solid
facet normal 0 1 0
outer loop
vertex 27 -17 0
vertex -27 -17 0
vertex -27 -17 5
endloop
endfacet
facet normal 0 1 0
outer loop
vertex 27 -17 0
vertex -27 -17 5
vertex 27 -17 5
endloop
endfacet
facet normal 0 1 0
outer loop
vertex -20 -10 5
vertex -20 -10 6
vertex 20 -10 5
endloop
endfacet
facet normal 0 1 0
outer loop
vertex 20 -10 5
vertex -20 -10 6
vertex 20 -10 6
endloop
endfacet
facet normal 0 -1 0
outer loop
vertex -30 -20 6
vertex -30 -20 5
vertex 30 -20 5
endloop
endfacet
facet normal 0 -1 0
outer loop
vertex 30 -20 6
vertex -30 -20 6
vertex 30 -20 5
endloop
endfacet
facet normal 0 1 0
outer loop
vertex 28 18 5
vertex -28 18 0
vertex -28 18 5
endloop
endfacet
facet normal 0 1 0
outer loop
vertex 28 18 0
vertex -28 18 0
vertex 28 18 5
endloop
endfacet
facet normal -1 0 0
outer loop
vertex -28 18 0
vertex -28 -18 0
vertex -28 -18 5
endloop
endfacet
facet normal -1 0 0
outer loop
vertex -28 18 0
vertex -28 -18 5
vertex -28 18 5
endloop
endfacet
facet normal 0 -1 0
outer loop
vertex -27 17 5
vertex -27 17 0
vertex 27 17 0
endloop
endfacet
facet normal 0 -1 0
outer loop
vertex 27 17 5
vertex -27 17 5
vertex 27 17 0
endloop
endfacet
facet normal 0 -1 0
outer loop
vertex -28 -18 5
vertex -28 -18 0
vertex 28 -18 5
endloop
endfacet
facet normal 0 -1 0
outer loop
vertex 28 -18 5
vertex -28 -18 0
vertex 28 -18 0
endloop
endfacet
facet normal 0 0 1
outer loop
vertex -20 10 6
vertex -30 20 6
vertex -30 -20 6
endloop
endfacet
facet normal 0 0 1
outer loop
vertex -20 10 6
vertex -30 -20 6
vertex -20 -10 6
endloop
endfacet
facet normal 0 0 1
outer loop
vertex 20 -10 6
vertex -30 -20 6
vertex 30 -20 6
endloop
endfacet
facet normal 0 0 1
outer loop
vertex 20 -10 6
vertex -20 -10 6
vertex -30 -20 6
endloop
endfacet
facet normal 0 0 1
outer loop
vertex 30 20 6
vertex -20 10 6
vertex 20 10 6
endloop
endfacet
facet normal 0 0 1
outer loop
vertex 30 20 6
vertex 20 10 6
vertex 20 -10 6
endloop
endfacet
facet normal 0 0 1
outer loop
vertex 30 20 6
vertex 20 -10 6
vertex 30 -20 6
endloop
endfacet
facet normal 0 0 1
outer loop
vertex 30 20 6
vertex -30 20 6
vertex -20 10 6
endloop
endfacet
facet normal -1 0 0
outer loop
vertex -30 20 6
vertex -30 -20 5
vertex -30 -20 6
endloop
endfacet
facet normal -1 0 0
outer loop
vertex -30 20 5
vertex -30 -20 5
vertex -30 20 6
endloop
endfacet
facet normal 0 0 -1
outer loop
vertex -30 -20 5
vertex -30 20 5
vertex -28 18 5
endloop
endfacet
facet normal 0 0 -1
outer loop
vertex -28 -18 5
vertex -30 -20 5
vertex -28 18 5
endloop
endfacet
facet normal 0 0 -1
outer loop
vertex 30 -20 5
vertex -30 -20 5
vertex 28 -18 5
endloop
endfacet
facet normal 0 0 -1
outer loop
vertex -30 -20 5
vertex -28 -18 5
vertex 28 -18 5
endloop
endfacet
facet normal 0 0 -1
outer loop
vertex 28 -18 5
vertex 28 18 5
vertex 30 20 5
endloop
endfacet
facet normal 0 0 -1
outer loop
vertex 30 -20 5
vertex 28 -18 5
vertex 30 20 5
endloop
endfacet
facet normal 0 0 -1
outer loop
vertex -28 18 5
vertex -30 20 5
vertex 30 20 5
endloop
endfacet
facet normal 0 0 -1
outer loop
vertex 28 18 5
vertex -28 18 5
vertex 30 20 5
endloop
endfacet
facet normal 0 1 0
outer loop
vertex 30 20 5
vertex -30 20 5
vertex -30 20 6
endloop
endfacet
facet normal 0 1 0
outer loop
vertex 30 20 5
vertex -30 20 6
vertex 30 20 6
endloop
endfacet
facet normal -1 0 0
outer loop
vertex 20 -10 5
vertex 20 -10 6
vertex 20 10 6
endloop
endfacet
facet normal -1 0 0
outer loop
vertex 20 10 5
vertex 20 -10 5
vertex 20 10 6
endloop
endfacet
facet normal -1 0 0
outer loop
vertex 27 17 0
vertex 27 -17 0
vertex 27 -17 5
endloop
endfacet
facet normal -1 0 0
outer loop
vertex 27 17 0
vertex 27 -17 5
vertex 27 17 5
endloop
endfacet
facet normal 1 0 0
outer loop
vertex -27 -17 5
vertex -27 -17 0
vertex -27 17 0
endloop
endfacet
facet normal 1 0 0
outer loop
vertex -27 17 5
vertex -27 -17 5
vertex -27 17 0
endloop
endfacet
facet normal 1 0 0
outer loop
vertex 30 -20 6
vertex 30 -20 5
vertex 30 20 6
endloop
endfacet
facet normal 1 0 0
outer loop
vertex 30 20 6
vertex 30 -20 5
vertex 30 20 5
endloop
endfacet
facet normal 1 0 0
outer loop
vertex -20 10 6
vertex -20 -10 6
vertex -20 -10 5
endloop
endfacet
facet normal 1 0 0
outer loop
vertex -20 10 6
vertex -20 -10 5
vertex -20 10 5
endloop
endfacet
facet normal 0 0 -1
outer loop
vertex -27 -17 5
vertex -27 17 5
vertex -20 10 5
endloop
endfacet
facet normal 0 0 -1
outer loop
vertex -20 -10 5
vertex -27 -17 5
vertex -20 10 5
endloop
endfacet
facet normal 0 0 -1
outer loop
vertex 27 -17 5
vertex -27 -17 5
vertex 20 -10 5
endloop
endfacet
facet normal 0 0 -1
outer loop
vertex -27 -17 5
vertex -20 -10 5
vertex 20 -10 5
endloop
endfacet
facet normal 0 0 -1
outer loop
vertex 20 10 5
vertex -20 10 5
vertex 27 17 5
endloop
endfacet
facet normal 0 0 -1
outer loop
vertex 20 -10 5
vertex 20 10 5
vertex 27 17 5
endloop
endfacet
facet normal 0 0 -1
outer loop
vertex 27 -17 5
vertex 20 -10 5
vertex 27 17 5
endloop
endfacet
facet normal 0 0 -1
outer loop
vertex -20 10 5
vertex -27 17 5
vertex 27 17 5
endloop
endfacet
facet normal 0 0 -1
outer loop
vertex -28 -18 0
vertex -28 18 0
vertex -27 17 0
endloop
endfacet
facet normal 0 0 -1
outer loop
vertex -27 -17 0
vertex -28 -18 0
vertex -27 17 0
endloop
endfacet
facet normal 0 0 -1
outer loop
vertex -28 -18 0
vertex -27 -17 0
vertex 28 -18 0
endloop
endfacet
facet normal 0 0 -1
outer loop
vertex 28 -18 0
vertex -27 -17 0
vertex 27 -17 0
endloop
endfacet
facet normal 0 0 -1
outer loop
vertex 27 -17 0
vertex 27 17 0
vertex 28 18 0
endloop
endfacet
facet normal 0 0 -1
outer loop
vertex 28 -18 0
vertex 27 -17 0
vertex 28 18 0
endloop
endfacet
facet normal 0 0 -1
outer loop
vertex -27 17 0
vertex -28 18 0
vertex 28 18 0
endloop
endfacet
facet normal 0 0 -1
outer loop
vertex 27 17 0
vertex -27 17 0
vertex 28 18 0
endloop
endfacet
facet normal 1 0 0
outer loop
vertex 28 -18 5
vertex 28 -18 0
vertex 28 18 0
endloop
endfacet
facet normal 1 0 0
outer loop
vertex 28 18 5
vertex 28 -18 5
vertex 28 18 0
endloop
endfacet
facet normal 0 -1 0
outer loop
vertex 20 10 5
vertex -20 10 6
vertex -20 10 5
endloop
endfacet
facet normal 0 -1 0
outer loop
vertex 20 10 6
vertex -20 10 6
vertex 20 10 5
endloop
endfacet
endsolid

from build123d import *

# Parameters (mm, degrees)
SKETCH1_W           = 56
SKETCH1_H           = 36
SKETCH1_W_2         = 54
SKETCH1_H_2         = 34
BOSS_EXTRUDE1_DEPTH = 5
SKETCH3_W           = 60
SKETCH3_H           = 40
BOSS_EXTRUDE3_DEPTH = 1
SKETCH4_W           = 40
SKETCH4_H           = 20
CUT_EXTRUDE2_DEPTH  = 7


with BuildPart() as part:
    # Sketch1 → Boss-Extrude1 (new body)
    with BuildSketch(Plane.XY):
        Rectangle(SKETCH1_W, SKETCH1_H)
        Rectangle(SKETCH1_W_2, SKETCH1_H_2, mode=Mode.SUBTRACT)
    extrude(amount=BOSS_EXTRUDE1_DEPTH)

    # Sketch3 → Boss-Extrude3 (add)
    with BuildSketch(Plane.XY.offset(5)):
        Rectangle(SKETCH3_W, SKETCH3_H)
    extrude(amount=BOSS_EXTRUDE3_DEPTH)

    # Sketch4 → Cut-Extrude2 (cut, through all)
    with BuildSketch(Plane.XY.offset(6)):
        Rectangle(SKETCH4_W, SKETCH4_H)
    extrude(amount=-CUT_EXTRUDE2_DEPTH, mode=Mode.SUBTRACT)


solid = part.part
